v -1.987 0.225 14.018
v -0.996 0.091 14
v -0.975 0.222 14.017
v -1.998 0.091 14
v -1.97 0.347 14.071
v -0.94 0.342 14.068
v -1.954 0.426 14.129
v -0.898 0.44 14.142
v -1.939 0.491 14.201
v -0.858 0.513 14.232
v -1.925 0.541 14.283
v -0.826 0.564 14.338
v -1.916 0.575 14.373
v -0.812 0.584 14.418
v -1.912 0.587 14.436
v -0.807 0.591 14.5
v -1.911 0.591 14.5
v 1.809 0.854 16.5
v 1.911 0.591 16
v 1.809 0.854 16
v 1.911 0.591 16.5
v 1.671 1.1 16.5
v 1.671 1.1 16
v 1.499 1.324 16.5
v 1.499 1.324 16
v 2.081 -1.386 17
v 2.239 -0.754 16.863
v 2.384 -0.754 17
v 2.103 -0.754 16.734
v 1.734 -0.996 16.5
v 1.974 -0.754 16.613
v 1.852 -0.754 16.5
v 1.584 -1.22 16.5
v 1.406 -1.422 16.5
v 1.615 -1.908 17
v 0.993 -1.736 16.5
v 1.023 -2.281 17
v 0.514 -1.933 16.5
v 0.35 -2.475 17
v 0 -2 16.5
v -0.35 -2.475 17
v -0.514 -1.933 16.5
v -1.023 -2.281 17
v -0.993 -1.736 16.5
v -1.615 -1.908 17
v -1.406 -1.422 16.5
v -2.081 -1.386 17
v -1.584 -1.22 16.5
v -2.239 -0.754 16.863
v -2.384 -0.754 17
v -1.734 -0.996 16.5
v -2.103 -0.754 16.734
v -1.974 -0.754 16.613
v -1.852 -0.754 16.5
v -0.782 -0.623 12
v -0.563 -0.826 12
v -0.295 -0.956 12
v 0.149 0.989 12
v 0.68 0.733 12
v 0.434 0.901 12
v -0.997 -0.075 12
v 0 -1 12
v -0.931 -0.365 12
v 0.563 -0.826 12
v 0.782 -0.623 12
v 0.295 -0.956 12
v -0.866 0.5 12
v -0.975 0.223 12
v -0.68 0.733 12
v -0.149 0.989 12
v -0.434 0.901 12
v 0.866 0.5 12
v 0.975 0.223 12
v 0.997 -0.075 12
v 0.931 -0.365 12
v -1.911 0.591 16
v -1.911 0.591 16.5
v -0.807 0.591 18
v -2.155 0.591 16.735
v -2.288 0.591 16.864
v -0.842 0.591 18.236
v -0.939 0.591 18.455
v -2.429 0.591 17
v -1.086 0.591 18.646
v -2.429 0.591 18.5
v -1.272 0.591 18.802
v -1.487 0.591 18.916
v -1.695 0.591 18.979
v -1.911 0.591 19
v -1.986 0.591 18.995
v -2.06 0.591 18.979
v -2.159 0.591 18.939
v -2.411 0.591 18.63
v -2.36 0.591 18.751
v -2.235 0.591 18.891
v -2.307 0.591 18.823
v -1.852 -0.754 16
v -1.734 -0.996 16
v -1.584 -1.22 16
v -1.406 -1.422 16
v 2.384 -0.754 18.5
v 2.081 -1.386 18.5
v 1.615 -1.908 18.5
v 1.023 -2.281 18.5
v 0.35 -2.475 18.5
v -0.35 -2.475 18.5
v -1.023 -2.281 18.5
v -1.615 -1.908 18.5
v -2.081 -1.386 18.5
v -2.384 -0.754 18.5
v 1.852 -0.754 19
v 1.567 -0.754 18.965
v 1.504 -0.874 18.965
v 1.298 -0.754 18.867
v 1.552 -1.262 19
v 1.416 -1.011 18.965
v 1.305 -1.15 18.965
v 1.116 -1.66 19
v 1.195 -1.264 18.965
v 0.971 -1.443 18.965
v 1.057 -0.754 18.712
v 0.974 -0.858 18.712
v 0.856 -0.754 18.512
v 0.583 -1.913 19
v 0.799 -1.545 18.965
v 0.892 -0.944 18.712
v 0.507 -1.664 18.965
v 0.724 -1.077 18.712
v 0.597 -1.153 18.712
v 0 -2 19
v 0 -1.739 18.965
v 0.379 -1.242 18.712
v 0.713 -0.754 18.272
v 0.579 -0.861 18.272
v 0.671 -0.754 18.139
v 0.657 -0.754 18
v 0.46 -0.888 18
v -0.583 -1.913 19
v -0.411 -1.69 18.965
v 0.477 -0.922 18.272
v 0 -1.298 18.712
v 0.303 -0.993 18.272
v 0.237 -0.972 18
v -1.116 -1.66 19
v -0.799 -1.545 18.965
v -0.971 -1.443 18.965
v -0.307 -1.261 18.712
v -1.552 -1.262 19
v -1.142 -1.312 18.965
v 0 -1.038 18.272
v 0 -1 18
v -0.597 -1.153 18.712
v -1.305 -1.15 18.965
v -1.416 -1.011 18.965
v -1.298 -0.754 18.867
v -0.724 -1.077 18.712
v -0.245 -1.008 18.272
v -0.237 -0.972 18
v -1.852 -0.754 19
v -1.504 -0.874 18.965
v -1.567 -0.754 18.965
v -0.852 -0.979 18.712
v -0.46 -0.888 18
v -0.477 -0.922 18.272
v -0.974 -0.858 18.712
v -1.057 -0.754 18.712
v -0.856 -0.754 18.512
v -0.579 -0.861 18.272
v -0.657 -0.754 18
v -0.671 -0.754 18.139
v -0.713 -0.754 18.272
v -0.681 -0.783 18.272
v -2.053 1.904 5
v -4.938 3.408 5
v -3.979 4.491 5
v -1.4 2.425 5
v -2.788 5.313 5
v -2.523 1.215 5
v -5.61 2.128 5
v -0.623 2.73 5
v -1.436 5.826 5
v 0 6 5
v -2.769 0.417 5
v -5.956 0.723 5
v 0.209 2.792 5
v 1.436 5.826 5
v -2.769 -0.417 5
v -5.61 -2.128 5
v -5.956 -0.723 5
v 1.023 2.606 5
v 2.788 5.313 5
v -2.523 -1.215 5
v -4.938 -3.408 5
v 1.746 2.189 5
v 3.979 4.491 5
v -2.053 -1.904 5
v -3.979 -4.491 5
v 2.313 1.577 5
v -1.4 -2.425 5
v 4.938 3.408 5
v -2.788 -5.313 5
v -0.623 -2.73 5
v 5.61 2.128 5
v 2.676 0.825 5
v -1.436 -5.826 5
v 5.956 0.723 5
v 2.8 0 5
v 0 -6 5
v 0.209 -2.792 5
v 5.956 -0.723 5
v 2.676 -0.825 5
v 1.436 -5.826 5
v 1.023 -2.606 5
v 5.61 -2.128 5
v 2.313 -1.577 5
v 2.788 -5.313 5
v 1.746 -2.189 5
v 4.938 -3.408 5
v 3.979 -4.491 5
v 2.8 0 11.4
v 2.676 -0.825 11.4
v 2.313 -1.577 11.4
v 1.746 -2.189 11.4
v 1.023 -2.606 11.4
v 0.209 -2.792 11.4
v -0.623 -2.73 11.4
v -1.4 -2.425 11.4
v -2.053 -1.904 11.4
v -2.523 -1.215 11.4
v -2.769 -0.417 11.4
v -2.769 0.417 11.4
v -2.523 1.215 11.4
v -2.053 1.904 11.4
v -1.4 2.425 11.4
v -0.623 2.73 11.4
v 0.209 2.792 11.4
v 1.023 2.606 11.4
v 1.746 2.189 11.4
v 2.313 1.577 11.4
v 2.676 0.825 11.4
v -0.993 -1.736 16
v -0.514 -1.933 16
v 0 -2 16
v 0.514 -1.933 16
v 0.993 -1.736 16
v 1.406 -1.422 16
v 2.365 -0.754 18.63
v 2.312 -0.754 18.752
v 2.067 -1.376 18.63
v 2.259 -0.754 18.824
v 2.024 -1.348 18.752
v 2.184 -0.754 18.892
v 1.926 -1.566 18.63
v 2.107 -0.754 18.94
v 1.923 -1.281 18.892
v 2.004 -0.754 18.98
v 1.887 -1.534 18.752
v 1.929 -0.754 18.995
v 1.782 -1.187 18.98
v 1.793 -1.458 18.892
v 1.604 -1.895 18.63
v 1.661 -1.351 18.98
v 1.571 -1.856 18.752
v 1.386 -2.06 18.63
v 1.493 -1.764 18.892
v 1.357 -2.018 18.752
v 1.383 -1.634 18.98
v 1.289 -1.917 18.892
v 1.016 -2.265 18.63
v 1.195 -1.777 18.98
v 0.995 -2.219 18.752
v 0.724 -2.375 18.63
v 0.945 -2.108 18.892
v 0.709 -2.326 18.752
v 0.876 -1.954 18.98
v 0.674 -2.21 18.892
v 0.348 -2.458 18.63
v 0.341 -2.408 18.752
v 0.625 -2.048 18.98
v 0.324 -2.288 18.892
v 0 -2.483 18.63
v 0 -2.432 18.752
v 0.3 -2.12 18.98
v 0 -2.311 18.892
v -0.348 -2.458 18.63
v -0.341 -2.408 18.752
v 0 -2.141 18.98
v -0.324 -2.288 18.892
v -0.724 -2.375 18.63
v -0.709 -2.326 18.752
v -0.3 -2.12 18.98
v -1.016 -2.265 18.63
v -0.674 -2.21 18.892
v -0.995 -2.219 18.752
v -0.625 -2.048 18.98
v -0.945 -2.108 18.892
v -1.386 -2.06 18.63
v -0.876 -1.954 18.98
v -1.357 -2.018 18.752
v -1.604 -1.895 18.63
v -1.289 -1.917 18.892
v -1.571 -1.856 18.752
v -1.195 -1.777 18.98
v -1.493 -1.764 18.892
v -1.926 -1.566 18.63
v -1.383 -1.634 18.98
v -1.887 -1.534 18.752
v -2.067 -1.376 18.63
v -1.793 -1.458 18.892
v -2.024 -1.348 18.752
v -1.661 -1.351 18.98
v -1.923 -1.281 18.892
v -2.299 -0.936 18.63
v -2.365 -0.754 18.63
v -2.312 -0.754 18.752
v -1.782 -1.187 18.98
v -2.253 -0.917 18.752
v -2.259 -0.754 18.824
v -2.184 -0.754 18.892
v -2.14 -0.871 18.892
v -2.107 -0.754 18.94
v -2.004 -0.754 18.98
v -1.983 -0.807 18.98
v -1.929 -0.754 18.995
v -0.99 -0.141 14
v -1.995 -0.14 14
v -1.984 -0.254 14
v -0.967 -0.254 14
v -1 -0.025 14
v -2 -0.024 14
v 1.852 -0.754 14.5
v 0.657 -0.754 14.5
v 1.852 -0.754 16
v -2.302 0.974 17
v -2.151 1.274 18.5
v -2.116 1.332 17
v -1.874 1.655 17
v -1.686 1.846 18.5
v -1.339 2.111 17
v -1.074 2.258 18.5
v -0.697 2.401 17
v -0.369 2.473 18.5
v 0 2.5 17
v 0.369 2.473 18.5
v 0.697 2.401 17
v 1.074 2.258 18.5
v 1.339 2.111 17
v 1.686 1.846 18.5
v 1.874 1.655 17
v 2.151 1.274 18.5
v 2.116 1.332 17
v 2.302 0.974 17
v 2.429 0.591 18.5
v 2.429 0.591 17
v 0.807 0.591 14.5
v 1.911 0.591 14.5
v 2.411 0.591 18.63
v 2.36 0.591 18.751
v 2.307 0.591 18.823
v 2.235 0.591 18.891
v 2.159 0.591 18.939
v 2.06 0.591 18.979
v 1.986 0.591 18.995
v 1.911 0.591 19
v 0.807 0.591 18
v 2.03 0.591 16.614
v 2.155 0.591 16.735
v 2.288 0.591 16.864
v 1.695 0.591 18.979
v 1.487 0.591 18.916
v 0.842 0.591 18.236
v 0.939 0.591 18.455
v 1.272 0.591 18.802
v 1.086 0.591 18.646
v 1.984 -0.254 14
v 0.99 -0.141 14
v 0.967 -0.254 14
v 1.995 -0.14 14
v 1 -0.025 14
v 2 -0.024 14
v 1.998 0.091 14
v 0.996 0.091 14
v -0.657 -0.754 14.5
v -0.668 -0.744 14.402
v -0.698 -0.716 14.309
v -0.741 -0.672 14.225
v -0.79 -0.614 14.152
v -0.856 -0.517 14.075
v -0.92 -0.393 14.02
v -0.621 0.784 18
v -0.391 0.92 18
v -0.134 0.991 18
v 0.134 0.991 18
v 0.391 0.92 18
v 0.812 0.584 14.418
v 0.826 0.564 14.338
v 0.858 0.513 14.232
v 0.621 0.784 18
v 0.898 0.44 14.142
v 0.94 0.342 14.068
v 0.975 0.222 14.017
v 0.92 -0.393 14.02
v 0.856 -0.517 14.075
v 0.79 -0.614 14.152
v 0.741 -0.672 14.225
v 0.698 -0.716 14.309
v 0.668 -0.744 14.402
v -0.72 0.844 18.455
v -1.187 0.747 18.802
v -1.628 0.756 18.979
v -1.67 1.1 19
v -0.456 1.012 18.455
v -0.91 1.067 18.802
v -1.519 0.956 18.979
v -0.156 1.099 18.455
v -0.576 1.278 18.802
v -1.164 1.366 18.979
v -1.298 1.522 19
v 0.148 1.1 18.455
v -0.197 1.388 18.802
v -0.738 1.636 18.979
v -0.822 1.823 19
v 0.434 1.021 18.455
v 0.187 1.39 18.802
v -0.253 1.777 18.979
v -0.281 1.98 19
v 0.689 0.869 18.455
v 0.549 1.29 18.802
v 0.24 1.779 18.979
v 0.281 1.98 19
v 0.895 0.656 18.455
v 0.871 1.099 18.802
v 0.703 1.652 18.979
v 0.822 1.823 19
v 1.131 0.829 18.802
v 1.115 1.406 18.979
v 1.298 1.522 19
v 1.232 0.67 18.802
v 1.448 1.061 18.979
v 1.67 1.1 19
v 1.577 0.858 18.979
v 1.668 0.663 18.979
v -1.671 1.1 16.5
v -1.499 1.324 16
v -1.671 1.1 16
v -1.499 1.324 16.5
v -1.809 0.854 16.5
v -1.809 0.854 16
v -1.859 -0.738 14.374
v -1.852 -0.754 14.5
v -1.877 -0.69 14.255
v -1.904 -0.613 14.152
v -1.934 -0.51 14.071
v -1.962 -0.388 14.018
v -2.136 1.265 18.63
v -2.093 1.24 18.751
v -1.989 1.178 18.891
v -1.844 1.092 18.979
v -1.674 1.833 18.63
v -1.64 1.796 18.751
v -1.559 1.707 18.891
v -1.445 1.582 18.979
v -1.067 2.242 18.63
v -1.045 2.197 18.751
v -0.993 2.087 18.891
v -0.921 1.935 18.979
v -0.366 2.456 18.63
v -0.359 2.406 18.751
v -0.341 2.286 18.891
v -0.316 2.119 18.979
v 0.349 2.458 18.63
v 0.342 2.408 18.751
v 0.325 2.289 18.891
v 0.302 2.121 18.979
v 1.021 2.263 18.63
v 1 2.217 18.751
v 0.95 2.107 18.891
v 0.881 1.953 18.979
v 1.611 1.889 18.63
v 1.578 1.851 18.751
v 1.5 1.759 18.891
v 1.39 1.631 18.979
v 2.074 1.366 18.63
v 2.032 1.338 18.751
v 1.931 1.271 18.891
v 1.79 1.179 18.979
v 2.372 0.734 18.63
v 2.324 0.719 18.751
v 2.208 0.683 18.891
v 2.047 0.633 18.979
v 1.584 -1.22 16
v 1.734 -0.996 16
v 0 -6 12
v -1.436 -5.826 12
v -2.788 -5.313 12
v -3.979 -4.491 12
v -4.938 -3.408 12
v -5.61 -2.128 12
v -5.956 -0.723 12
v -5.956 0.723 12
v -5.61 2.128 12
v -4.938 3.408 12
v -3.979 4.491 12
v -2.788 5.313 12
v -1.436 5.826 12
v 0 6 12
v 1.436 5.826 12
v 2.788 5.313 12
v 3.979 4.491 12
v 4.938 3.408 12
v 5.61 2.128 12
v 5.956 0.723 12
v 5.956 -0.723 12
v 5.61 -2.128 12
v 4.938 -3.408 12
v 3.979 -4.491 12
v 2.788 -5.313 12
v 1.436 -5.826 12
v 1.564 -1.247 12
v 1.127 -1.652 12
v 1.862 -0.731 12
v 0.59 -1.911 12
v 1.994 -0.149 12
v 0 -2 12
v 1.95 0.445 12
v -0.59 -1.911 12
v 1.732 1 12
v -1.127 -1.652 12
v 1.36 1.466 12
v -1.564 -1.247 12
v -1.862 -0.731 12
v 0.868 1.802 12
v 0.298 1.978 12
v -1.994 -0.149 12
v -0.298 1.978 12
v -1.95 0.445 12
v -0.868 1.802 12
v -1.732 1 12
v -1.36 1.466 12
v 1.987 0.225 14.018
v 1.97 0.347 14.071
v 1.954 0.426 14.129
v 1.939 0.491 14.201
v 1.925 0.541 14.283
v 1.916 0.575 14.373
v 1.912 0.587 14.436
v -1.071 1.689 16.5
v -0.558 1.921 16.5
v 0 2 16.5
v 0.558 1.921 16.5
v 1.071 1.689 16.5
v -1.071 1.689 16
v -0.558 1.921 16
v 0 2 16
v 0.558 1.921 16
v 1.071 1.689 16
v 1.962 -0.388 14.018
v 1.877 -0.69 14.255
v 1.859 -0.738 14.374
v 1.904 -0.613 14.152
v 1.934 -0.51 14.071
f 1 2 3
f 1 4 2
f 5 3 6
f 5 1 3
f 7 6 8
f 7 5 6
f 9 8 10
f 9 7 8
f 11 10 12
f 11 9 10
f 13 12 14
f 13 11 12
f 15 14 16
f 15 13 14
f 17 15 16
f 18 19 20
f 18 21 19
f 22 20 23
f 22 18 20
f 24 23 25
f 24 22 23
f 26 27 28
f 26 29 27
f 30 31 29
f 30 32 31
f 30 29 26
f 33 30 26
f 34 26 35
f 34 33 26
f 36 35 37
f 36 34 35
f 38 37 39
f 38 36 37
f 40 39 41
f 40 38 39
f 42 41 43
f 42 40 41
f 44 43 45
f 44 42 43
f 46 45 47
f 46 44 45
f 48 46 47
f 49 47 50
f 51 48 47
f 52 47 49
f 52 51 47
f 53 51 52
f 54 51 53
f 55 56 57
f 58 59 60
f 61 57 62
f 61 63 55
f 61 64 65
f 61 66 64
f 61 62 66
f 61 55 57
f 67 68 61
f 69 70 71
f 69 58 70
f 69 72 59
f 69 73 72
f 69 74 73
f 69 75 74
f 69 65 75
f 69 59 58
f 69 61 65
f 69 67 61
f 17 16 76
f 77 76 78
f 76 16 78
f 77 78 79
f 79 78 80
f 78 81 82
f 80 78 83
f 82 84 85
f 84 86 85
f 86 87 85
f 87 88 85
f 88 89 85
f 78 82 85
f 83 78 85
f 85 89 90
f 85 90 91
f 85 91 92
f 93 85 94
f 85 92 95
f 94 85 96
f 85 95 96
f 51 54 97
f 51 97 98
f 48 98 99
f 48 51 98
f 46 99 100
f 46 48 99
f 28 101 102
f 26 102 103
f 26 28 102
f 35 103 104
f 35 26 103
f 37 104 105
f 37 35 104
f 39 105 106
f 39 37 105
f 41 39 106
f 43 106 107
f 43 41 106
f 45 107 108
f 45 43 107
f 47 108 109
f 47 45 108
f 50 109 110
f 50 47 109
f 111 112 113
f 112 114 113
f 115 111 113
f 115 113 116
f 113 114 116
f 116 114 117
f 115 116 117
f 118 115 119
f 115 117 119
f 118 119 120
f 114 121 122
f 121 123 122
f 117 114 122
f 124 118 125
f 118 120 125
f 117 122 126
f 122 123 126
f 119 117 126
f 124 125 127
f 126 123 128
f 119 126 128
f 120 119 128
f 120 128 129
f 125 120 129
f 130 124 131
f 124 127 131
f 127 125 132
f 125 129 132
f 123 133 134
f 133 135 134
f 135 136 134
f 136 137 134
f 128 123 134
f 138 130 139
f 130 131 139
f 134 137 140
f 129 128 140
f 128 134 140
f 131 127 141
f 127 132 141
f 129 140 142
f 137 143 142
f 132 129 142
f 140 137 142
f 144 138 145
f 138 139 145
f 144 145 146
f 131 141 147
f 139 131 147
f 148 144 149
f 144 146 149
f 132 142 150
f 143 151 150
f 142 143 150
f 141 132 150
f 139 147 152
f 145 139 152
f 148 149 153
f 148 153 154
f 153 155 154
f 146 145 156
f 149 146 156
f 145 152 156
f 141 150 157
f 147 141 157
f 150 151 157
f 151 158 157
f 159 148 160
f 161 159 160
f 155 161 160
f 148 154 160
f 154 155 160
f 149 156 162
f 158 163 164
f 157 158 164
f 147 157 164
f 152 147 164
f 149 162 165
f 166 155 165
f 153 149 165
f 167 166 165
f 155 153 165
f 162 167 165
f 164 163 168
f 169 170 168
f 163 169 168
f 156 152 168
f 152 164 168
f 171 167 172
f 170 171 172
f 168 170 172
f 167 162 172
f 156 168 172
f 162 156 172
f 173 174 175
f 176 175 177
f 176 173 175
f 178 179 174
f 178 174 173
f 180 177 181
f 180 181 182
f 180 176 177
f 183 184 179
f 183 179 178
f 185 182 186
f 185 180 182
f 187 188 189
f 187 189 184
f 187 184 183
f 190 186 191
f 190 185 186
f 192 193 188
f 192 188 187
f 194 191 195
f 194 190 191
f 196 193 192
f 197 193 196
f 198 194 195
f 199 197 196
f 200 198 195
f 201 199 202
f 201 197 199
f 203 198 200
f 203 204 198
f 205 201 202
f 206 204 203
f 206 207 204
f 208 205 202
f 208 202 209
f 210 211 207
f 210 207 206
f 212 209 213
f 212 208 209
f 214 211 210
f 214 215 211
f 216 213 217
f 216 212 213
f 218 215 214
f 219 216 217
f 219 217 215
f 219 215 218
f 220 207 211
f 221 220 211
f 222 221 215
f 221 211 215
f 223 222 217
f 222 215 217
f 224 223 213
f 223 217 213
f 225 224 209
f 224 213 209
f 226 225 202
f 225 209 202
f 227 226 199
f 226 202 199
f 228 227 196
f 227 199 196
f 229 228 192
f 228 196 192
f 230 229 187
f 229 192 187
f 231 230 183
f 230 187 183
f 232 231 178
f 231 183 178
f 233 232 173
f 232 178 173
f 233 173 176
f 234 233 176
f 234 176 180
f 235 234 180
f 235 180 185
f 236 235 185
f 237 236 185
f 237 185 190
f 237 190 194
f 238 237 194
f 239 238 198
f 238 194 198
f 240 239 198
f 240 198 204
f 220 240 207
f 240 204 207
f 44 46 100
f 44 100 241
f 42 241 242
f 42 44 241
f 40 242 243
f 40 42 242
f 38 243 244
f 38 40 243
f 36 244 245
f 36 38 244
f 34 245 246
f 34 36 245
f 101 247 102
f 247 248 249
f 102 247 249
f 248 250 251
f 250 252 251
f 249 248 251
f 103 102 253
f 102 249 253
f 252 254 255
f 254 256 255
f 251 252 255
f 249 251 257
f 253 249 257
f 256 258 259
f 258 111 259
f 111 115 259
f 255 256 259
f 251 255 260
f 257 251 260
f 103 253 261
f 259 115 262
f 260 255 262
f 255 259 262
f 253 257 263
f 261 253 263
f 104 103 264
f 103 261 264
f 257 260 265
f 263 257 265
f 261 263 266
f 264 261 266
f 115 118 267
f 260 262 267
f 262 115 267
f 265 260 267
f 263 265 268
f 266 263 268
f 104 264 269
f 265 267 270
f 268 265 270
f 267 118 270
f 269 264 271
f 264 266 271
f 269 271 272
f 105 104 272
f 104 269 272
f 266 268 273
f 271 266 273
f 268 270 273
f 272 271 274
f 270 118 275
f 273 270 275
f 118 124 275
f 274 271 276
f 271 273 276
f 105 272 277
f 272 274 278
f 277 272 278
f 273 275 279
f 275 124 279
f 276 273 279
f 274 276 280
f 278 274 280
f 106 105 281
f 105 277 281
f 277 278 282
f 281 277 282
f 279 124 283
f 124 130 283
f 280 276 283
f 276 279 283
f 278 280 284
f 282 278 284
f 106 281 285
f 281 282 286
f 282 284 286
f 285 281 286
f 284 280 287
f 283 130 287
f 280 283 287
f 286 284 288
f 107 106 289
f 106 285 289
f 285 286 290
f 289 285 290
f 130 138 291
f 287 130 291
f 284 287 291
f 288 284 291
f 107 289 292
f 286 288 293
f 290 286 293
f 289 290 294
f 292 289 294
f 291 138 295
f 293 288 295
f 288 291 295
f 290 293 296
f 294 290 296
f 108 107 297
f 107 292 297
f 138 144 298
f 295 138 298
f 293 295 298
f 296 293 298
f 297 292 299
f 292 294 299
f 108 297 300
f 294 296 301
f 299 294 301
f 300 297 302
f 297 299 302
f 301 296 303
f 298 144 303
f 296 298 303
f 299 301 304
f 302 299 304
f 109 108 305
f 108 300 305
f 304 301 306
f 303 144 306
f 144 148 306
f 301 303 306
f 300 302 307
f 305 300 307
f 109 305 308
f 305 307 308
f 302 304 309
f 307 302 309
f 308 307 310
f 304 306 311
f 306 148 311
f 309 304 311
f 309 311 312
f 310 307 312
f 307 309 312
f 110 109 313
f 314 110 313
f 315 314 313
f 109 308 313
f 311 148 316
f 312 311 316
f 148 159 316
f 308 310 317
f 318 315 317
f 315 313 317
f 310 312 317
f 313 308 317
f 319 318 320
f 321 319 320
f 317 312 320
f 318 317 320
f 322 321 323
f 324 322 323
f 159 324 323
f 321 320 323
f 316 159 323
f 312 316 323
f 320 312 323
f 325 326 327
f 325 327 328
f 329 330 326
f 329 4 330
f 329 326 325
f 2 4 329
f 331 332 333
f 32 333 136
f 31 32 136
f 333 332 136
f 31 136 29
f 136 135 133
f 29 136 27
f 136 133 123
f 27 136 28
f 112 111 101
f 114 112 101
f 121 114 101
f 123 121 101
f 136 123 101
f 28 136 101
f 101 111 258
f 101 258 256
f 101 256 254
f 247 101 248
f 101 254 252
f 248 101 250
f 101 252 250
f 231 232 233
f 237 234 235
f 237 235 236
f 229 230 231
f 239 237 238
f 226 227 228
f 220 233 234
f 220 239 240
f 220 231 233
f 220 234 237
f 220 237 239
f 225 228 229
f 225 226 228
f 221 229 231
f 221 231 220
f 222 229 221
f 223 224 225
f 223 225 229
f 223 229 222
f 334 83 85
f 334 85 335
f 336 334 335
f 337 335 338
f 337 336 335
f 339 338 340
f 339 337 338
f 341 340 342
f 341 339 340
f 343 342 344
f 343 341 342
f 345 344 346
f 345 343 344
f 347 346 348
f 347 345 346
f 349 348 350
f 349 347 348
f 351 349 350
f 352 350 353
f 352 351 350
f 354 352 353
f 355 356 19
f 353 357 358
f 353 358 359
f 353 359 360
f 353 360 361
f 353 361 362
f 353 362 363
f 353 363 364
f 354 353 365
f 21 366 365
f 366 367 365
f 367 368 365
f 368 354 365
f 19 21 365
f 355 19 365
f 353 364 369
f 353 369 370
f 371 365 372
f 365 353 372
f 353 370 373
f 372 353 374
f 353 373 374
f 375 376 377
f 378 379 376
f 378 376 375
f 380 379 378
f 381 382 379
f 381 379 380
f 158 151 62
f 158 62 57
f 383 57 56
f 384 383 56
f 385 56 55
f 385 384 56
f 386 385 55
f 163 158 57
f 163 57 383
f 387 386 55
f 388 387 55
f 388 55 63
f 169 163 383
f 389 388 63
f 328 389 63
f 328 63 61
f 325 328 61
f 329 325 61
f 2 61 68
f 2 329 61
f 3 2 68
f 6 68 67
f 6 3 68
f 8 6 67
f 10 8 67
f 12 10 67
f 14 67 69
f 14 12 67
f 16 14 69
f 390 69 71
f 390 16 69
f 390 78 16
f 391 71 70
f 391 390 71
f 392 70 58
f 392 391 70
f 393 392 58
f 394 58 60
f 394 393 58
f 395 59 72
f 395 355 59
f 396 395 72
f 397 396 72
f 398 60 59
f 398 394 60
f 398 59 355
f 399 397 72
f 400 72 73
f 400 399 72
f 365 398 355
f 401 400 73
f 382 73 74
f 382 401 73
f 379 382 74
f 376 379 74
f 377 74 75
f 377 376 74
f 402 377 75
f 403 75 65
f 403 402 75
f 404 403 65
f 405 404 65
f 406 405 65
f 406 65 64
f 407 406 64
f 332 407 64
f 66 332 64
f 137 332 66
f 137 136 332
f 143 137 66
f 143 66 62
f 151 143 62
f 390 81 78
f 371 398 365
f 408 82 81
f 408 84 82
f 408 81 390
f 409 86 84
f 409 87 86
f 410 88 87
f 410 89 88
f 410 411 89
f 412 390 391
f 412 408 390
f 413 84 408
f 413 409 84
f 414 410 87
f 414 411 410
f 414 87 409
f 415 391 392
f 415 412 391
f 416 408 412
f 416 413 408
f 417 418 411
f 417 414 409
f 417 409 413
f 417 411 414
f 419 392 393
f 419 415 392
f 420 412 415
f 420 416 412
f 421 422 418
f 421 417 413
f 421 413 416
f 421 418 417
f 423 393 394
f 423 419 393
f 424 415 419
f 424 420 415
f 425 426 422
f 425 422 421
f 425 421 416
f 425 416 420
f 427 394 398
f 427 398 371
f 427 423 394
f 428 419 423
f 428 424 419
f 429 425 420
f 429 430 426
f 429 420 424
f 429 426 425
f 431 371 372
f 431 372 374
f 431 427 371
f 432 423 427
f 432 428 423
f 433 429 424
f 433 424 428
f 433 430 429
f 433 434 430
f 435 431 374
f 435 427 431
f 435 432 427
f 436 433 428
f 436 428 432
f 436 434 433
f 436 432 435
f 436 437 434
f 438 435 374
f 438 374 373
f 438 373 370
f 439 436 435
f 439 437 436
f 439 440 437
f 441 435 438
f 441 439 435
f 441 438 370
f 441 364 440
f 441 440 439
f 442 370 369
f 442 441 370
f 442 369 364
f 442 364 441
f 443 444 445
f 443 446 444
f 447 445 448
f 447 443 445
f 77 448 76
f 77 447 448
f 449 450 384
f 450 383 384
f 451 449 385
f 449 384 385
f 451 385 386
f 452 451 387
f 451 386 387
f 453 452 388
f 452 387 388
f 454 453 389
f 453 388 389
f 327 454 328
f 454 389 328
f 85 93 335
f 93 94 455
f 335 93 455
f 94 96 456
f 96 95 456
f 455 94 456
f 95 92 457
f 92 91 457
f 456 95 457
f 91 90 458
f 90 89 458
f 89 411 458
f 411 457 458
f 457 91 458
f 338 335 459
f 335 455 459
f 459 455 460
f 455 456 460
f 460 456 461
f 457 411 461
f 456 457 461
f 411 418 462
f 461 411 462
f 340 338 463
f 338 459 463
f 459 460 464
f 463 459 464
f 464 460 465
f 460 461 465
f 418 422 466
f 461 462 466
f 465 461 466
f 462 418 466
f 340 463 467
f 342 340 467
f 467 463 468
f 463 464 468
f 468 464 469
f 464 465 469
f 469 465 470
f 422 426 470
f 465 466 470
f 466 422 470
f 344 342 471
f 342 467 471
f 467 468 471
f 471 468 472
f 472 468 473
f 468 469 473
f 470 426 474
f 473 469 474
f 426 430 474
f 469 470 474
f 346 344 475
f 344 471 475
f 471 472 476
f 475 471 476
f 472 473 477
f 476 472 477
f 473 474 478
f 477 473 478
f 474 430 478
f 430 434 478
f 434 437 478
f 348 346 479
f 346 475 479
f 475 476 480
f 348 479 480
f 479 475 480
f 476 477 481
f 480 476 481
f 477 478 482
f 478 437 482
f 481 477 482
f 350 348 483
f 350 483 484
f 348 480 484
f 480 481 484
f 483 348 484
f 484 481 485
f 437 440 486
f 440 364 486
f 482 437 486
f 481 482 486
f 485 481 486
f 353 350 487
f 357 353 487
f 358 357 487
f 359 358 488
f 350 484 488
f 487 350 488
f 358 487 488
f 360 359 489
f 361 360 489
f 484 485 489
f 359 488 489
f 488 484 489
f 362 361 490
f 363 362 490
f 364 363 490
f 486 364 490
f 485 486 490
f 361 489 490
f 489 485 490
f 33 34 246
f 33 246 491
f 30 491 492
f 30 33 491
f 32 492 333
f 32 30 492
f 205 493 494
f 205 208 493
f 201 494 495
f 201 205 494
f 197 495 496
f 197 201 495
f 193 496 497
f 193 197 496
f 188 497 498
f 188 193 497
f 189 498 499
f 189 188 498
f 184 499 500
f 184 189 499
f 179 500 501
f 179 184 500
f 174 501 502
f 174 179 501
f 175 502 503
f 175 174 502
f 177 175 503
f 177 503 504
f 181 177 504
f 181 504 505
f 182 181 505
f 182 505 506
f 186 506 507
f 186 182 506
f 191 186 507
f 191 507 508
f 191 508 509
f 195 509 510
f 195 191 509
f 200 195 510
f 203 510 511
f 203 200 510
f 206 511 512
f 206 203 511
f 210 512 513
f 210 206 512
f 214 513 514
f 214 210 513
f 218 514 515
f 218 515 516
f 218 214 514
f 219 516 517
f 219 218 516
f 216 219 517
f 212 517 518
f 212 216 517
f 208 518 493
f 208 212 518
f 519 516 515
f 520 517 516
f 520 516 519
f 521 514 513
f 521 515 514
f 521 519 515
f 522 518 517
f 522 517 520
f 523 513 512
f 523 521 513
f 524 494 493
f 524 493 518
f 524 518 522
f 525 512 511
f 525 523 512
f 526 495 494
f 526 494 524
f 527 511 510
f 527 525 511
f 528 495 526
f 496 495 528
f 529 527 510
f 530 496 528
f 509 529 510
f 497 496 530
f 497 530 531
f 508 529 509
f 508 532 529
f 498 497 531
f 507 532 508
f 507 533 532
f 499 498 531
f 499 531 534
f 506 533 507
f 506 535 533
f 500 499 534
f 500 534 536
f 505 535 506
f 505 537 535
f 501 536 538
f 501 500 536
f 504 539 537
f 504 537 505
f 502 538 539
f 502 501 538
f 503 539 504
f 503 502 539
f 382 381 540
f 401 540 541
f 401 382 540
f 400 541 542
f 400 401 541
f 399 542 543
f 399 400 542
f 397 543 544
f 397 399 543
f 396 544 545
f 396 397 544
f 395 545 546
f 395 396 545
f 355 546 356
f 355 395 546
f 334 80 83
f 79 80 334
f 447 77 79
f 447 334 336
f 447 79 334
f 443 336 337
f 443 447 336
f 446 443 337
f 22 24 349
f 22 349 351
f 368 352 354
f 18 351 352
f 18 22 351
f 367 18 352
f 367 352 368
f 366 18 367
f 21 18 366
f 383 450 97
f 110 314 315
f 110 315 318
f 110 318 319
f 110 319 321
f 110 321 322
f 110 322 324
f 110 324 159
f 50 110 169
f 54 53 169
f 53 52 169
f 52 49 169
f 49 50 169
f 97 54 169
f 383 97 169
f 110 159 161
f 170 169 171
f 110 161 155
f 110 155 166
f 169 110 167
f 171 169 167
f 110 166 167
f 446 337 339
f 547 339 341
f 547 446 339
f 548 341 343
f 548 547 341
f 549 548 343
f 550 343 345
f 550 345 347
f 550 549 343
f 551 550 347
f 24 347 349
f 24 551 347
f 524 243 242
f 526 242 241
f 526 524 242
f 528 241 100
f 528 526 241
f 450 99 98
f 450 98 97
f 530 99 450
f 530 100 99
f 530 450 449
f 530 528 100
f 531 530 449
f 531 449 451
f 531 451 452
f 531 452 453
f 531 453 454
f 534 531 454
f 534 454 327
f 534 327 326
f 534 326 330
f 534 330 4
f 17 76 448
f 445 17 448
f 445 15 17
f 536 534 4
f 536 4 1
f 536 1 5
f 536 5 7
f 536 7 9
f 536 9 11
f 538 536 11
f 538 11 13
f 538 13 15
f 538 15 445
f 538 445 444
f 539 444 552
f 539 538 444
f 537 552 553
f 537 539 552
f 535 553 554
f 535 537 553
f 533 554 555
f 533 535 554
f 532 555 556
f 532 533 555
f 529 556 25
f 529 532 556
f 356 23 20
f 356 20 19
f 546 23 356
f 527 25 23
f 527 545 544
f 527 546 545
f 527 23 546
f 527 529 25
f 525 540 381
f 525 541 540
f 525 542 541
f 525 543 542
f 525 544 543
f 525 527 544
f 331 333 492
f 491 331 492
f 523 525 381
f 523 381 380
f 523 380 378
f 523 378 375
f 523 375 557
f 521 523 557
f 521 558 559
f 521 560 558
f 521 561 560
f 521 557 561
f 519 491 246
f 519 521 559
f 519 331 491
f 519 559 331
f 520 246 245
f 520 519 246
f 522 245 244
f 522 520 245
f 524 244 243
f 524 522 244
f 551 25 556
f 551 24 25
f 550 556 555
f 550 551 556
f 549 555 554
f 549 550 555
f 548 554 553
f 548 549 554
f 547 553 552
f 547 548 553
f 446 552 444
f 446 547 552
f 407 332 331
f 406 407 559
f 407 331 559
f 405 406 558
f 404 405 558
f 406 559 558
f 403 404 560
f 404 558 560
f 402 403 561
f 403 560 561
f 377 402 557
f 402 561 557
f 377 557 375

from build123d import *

# Parameters (mm, degrees)
F3_DEPTH     = 5
F4_T4_ANGLE  = 270.6670948428
F4_S5_R      = 2
F4_T6_DEPTH  = 5
F4_T10_ANGLE = 262.8807253971
F4_S11_R     = 2
F4_T12_DEPTH = 5
F5_SIZE      = 1
F6_R         = 1
F7_R         = 0.49999
F8_R         = 0.5
F9_W         = 20.6344220787
F9_H         = 19.8933202773
F9_R         = 5
F10_DEPTH    = 5
F11_R        = 2.8
F12_DEPTH    = 6.4


# Not quite as in the source:
# - a fillet or chamfer that OpenCascade refuses, or shapes differently, is made with other operations: its cross-section is extruded or revolved along the edge and cut away or added
# - a fillet or chamfer is up to 0.001 mm smaller than in the source, because OpenCascade refuses the exact size


with BuildPart() as f1:
    # F0 (on Right) → F1 (revolve)
    with BuildSketch(Plane.YZ):
        Polygon((-6, 0), (0, 0), (0, 12), (-1, 12), (-1, 16), (-1, 19), (-2, 19), (-2.5, 19), (-2.5, 16), (-2, 16), (-2, 12), (-6, 12), align=None)
    revolve(axis=Axis((0, 0, 6), (0, 0, -1)))

    # F2 (on face) → F3 (cut)
    with BuildSketch(Plane.XY.offset(19)):
        with BuildLine():
            Line((-0.8067003414, 0.5909607086), (-2.4291491187, 0.5909607086))
            ThreePointArc((-2.4291491187, 0.5909607086), (-2.4985623215, -0.0847721969), (-2.3835084063, -0.75424643))
            Line((-2.3835084063, -0.75424643), (-0.6565914428, -0.75424643))
            ThreePointArc((-0.6565914428, -0.75424643), (-0.993831612, -0.1108996261), (-0.8067003414, 0.5909607086))
        make_face()
        with BuildLine():
            ThreePointArc((1, 0), (0.9504473529, 0.3108855566), (0.8067003414, 0.5909607086))
            Line((0.8067003414, 0.5909607086), (-0.8067003414, 0.5909607086))
            ThreePointArc((-0.8067003414, 0.5909607086), (-0.993831612, -0.1108996261), (-0.6565914428, -0.75424643))
            Line((-0.6565914428, -0.75424643), (0.6565914428, -0.75424643))
            ThreePointArc((0.6565914428, -0.75424643), (0.9101075329, -0.4143721499), (1, 0))
        make_face()
        with BuildLine():
            ThreePointArc((2.5, 0), (2.482224083, 0.2975963737), (2.4291491187, 0.5909607086))
            Line((2.4291491187, 0.5909607086), (0.8067003414, 0.5909607086))
            ThreePointArc((0.8067003414, 0.5909607086), (0.9504473529, 0.3108855566), (1, 0))
            ThreePointArc((1, 0), (0.9101075329, -0.4143721499), (0.6565914428, -0.75424643))
            Line((0.6565914428, -0.75424643), (2.3835084063, -0.75424643))
            ThreePointArc((2.3835084063, -0.75424643), (2.4707054676, -0.38159467), (2.5, 0))
        make_face()
    extrude(amount=-F3_DEPTH, mode=Mode.SUBTRACT)

    # F4: chamfer of 1 on 2 edges, made by hand


with BuildPart() as f4_tool2:
    # F4_s3 → F4_t4 (revolve)
    with BuildSketch(Plane(origin=(0, 0, 0), x_dir=(0, 0, 1), z_dir=(0.7112111987, -0.7029784, 0))):
        Polygon((17, 2.5), (16, 1.5), (16, 2.5), align=None)
    revolve(axis=Axis((0, 0, 16), (0, 0, -1)), revolution_arc=F4_T4_ANGLE)

    # F4_s5 → F4_t6 (cut, symmetric)
    with BuildSketch(Plane.XY.offset(16.5)):
        Circle(F4_S5_R)
    extrude(amount=F4_T6_DEPTH, both=True, mode=Mode.SUBTRACT)


with BuildPart() as f1_1:
    add(f1.part)

    # F4_t1: cut F4_tool2
    add(f4_tool2.part, mode=Mode.SUBTRACT)


with BuildPart() as f4_tool8:
    # F4_s9 → F4_t10 (revolve)
    with BuildSketch(Plane(origin=(0, 0, 0), x_dir=(0, 0, 1), z_dir=(-0.6618401259, 0.7496450145, 0))):
        Polygon((17, 2.5), (16, 1.5), (16, 2.5), align=None)
    revolve(axis=Axis((0, 0, 16), (0, 0, -1)), revolution_arc=F4_T10_ANGLE)

    # F4_s11 → F4_t12 (cut, symmetric)
    with BuildSketch(Plane.XY.offset(16.5)):
        Circle(F4_S11_R)
    extrude(amount=F4_T12_DEPTH, both=True, mode=Mode.SUBTRACT)


with BuildPart() as f1_2:
    add(f1_1.part)

    # F4_t7: cut F4_tool8
    add(f4_tool8.part, mode=Mode.SUBTRACT)

    # F5
    f5_edges = [f1_2.edges().sort_by_distance(p)[0] for p in [
        (0, 6, 0),
    ]]
    chamfer(f5_edges, length=F5_SIZE)

    # F6
    f6_edges = [f1_2.edges().sort_by_distance(p)[0] for p in [
        (0, 1, 19),
        (-0.350538, -0.936549, 19),
        (0.350538, -0.936549, 19),
    ]]
    fillet(f6_edges, radius=F6_R)

    # F7 (radius 0.5 in the source; OpenCascade refuses exactly that, so slightly less here)
    f7_edges = [f1_2.edges().sort_by_distance(p)[0] for p in [
        (0, -2.5, 19),
        (0, 2.5, 19),
    ]]
    fillet(f7_edges, radius=F7_R)

    # F8
    f8_edges = [f1_2.edges().sort_by_distance(p)[0] for p in [
        (-1.254459, -0.754246, 14),
        (1.254459, -0.754246, 14),
        (-1.358699, 0.590961, 14),
        (1.358699, 0.590961, 14),
    ]]
    fillet(f8_edges, radius=F8_R)

    # F9 (on face) → F10 (cut)
    with BuildSketch(Plane(origin=(0, 0, 0), x_dir=(1, 0, 0), z_dir=(0, 0, -1))):
        with Locations((1.0028546676, -0.4471866414)):
            Rectangle(F9_W, F9_H)
        Circle(F9_R, mode=Mode.SUBTRACT)
        Circle(F9_R)
    extrude(amount=-F10_DEPTH, mode=Mode.SUBTRACT)

    # F11 (on face) → F12 (cut)
    with BuildSketch(Plane(origin=(0, 0, 5), x_dir=(1, 0, 0), z_dir=(0, 0, -1))):
        Circle(F11_R)
    extrude(amount=-F12_DEPTH, mode=Mode.SUBTRACT)


solid = f1_2.part
